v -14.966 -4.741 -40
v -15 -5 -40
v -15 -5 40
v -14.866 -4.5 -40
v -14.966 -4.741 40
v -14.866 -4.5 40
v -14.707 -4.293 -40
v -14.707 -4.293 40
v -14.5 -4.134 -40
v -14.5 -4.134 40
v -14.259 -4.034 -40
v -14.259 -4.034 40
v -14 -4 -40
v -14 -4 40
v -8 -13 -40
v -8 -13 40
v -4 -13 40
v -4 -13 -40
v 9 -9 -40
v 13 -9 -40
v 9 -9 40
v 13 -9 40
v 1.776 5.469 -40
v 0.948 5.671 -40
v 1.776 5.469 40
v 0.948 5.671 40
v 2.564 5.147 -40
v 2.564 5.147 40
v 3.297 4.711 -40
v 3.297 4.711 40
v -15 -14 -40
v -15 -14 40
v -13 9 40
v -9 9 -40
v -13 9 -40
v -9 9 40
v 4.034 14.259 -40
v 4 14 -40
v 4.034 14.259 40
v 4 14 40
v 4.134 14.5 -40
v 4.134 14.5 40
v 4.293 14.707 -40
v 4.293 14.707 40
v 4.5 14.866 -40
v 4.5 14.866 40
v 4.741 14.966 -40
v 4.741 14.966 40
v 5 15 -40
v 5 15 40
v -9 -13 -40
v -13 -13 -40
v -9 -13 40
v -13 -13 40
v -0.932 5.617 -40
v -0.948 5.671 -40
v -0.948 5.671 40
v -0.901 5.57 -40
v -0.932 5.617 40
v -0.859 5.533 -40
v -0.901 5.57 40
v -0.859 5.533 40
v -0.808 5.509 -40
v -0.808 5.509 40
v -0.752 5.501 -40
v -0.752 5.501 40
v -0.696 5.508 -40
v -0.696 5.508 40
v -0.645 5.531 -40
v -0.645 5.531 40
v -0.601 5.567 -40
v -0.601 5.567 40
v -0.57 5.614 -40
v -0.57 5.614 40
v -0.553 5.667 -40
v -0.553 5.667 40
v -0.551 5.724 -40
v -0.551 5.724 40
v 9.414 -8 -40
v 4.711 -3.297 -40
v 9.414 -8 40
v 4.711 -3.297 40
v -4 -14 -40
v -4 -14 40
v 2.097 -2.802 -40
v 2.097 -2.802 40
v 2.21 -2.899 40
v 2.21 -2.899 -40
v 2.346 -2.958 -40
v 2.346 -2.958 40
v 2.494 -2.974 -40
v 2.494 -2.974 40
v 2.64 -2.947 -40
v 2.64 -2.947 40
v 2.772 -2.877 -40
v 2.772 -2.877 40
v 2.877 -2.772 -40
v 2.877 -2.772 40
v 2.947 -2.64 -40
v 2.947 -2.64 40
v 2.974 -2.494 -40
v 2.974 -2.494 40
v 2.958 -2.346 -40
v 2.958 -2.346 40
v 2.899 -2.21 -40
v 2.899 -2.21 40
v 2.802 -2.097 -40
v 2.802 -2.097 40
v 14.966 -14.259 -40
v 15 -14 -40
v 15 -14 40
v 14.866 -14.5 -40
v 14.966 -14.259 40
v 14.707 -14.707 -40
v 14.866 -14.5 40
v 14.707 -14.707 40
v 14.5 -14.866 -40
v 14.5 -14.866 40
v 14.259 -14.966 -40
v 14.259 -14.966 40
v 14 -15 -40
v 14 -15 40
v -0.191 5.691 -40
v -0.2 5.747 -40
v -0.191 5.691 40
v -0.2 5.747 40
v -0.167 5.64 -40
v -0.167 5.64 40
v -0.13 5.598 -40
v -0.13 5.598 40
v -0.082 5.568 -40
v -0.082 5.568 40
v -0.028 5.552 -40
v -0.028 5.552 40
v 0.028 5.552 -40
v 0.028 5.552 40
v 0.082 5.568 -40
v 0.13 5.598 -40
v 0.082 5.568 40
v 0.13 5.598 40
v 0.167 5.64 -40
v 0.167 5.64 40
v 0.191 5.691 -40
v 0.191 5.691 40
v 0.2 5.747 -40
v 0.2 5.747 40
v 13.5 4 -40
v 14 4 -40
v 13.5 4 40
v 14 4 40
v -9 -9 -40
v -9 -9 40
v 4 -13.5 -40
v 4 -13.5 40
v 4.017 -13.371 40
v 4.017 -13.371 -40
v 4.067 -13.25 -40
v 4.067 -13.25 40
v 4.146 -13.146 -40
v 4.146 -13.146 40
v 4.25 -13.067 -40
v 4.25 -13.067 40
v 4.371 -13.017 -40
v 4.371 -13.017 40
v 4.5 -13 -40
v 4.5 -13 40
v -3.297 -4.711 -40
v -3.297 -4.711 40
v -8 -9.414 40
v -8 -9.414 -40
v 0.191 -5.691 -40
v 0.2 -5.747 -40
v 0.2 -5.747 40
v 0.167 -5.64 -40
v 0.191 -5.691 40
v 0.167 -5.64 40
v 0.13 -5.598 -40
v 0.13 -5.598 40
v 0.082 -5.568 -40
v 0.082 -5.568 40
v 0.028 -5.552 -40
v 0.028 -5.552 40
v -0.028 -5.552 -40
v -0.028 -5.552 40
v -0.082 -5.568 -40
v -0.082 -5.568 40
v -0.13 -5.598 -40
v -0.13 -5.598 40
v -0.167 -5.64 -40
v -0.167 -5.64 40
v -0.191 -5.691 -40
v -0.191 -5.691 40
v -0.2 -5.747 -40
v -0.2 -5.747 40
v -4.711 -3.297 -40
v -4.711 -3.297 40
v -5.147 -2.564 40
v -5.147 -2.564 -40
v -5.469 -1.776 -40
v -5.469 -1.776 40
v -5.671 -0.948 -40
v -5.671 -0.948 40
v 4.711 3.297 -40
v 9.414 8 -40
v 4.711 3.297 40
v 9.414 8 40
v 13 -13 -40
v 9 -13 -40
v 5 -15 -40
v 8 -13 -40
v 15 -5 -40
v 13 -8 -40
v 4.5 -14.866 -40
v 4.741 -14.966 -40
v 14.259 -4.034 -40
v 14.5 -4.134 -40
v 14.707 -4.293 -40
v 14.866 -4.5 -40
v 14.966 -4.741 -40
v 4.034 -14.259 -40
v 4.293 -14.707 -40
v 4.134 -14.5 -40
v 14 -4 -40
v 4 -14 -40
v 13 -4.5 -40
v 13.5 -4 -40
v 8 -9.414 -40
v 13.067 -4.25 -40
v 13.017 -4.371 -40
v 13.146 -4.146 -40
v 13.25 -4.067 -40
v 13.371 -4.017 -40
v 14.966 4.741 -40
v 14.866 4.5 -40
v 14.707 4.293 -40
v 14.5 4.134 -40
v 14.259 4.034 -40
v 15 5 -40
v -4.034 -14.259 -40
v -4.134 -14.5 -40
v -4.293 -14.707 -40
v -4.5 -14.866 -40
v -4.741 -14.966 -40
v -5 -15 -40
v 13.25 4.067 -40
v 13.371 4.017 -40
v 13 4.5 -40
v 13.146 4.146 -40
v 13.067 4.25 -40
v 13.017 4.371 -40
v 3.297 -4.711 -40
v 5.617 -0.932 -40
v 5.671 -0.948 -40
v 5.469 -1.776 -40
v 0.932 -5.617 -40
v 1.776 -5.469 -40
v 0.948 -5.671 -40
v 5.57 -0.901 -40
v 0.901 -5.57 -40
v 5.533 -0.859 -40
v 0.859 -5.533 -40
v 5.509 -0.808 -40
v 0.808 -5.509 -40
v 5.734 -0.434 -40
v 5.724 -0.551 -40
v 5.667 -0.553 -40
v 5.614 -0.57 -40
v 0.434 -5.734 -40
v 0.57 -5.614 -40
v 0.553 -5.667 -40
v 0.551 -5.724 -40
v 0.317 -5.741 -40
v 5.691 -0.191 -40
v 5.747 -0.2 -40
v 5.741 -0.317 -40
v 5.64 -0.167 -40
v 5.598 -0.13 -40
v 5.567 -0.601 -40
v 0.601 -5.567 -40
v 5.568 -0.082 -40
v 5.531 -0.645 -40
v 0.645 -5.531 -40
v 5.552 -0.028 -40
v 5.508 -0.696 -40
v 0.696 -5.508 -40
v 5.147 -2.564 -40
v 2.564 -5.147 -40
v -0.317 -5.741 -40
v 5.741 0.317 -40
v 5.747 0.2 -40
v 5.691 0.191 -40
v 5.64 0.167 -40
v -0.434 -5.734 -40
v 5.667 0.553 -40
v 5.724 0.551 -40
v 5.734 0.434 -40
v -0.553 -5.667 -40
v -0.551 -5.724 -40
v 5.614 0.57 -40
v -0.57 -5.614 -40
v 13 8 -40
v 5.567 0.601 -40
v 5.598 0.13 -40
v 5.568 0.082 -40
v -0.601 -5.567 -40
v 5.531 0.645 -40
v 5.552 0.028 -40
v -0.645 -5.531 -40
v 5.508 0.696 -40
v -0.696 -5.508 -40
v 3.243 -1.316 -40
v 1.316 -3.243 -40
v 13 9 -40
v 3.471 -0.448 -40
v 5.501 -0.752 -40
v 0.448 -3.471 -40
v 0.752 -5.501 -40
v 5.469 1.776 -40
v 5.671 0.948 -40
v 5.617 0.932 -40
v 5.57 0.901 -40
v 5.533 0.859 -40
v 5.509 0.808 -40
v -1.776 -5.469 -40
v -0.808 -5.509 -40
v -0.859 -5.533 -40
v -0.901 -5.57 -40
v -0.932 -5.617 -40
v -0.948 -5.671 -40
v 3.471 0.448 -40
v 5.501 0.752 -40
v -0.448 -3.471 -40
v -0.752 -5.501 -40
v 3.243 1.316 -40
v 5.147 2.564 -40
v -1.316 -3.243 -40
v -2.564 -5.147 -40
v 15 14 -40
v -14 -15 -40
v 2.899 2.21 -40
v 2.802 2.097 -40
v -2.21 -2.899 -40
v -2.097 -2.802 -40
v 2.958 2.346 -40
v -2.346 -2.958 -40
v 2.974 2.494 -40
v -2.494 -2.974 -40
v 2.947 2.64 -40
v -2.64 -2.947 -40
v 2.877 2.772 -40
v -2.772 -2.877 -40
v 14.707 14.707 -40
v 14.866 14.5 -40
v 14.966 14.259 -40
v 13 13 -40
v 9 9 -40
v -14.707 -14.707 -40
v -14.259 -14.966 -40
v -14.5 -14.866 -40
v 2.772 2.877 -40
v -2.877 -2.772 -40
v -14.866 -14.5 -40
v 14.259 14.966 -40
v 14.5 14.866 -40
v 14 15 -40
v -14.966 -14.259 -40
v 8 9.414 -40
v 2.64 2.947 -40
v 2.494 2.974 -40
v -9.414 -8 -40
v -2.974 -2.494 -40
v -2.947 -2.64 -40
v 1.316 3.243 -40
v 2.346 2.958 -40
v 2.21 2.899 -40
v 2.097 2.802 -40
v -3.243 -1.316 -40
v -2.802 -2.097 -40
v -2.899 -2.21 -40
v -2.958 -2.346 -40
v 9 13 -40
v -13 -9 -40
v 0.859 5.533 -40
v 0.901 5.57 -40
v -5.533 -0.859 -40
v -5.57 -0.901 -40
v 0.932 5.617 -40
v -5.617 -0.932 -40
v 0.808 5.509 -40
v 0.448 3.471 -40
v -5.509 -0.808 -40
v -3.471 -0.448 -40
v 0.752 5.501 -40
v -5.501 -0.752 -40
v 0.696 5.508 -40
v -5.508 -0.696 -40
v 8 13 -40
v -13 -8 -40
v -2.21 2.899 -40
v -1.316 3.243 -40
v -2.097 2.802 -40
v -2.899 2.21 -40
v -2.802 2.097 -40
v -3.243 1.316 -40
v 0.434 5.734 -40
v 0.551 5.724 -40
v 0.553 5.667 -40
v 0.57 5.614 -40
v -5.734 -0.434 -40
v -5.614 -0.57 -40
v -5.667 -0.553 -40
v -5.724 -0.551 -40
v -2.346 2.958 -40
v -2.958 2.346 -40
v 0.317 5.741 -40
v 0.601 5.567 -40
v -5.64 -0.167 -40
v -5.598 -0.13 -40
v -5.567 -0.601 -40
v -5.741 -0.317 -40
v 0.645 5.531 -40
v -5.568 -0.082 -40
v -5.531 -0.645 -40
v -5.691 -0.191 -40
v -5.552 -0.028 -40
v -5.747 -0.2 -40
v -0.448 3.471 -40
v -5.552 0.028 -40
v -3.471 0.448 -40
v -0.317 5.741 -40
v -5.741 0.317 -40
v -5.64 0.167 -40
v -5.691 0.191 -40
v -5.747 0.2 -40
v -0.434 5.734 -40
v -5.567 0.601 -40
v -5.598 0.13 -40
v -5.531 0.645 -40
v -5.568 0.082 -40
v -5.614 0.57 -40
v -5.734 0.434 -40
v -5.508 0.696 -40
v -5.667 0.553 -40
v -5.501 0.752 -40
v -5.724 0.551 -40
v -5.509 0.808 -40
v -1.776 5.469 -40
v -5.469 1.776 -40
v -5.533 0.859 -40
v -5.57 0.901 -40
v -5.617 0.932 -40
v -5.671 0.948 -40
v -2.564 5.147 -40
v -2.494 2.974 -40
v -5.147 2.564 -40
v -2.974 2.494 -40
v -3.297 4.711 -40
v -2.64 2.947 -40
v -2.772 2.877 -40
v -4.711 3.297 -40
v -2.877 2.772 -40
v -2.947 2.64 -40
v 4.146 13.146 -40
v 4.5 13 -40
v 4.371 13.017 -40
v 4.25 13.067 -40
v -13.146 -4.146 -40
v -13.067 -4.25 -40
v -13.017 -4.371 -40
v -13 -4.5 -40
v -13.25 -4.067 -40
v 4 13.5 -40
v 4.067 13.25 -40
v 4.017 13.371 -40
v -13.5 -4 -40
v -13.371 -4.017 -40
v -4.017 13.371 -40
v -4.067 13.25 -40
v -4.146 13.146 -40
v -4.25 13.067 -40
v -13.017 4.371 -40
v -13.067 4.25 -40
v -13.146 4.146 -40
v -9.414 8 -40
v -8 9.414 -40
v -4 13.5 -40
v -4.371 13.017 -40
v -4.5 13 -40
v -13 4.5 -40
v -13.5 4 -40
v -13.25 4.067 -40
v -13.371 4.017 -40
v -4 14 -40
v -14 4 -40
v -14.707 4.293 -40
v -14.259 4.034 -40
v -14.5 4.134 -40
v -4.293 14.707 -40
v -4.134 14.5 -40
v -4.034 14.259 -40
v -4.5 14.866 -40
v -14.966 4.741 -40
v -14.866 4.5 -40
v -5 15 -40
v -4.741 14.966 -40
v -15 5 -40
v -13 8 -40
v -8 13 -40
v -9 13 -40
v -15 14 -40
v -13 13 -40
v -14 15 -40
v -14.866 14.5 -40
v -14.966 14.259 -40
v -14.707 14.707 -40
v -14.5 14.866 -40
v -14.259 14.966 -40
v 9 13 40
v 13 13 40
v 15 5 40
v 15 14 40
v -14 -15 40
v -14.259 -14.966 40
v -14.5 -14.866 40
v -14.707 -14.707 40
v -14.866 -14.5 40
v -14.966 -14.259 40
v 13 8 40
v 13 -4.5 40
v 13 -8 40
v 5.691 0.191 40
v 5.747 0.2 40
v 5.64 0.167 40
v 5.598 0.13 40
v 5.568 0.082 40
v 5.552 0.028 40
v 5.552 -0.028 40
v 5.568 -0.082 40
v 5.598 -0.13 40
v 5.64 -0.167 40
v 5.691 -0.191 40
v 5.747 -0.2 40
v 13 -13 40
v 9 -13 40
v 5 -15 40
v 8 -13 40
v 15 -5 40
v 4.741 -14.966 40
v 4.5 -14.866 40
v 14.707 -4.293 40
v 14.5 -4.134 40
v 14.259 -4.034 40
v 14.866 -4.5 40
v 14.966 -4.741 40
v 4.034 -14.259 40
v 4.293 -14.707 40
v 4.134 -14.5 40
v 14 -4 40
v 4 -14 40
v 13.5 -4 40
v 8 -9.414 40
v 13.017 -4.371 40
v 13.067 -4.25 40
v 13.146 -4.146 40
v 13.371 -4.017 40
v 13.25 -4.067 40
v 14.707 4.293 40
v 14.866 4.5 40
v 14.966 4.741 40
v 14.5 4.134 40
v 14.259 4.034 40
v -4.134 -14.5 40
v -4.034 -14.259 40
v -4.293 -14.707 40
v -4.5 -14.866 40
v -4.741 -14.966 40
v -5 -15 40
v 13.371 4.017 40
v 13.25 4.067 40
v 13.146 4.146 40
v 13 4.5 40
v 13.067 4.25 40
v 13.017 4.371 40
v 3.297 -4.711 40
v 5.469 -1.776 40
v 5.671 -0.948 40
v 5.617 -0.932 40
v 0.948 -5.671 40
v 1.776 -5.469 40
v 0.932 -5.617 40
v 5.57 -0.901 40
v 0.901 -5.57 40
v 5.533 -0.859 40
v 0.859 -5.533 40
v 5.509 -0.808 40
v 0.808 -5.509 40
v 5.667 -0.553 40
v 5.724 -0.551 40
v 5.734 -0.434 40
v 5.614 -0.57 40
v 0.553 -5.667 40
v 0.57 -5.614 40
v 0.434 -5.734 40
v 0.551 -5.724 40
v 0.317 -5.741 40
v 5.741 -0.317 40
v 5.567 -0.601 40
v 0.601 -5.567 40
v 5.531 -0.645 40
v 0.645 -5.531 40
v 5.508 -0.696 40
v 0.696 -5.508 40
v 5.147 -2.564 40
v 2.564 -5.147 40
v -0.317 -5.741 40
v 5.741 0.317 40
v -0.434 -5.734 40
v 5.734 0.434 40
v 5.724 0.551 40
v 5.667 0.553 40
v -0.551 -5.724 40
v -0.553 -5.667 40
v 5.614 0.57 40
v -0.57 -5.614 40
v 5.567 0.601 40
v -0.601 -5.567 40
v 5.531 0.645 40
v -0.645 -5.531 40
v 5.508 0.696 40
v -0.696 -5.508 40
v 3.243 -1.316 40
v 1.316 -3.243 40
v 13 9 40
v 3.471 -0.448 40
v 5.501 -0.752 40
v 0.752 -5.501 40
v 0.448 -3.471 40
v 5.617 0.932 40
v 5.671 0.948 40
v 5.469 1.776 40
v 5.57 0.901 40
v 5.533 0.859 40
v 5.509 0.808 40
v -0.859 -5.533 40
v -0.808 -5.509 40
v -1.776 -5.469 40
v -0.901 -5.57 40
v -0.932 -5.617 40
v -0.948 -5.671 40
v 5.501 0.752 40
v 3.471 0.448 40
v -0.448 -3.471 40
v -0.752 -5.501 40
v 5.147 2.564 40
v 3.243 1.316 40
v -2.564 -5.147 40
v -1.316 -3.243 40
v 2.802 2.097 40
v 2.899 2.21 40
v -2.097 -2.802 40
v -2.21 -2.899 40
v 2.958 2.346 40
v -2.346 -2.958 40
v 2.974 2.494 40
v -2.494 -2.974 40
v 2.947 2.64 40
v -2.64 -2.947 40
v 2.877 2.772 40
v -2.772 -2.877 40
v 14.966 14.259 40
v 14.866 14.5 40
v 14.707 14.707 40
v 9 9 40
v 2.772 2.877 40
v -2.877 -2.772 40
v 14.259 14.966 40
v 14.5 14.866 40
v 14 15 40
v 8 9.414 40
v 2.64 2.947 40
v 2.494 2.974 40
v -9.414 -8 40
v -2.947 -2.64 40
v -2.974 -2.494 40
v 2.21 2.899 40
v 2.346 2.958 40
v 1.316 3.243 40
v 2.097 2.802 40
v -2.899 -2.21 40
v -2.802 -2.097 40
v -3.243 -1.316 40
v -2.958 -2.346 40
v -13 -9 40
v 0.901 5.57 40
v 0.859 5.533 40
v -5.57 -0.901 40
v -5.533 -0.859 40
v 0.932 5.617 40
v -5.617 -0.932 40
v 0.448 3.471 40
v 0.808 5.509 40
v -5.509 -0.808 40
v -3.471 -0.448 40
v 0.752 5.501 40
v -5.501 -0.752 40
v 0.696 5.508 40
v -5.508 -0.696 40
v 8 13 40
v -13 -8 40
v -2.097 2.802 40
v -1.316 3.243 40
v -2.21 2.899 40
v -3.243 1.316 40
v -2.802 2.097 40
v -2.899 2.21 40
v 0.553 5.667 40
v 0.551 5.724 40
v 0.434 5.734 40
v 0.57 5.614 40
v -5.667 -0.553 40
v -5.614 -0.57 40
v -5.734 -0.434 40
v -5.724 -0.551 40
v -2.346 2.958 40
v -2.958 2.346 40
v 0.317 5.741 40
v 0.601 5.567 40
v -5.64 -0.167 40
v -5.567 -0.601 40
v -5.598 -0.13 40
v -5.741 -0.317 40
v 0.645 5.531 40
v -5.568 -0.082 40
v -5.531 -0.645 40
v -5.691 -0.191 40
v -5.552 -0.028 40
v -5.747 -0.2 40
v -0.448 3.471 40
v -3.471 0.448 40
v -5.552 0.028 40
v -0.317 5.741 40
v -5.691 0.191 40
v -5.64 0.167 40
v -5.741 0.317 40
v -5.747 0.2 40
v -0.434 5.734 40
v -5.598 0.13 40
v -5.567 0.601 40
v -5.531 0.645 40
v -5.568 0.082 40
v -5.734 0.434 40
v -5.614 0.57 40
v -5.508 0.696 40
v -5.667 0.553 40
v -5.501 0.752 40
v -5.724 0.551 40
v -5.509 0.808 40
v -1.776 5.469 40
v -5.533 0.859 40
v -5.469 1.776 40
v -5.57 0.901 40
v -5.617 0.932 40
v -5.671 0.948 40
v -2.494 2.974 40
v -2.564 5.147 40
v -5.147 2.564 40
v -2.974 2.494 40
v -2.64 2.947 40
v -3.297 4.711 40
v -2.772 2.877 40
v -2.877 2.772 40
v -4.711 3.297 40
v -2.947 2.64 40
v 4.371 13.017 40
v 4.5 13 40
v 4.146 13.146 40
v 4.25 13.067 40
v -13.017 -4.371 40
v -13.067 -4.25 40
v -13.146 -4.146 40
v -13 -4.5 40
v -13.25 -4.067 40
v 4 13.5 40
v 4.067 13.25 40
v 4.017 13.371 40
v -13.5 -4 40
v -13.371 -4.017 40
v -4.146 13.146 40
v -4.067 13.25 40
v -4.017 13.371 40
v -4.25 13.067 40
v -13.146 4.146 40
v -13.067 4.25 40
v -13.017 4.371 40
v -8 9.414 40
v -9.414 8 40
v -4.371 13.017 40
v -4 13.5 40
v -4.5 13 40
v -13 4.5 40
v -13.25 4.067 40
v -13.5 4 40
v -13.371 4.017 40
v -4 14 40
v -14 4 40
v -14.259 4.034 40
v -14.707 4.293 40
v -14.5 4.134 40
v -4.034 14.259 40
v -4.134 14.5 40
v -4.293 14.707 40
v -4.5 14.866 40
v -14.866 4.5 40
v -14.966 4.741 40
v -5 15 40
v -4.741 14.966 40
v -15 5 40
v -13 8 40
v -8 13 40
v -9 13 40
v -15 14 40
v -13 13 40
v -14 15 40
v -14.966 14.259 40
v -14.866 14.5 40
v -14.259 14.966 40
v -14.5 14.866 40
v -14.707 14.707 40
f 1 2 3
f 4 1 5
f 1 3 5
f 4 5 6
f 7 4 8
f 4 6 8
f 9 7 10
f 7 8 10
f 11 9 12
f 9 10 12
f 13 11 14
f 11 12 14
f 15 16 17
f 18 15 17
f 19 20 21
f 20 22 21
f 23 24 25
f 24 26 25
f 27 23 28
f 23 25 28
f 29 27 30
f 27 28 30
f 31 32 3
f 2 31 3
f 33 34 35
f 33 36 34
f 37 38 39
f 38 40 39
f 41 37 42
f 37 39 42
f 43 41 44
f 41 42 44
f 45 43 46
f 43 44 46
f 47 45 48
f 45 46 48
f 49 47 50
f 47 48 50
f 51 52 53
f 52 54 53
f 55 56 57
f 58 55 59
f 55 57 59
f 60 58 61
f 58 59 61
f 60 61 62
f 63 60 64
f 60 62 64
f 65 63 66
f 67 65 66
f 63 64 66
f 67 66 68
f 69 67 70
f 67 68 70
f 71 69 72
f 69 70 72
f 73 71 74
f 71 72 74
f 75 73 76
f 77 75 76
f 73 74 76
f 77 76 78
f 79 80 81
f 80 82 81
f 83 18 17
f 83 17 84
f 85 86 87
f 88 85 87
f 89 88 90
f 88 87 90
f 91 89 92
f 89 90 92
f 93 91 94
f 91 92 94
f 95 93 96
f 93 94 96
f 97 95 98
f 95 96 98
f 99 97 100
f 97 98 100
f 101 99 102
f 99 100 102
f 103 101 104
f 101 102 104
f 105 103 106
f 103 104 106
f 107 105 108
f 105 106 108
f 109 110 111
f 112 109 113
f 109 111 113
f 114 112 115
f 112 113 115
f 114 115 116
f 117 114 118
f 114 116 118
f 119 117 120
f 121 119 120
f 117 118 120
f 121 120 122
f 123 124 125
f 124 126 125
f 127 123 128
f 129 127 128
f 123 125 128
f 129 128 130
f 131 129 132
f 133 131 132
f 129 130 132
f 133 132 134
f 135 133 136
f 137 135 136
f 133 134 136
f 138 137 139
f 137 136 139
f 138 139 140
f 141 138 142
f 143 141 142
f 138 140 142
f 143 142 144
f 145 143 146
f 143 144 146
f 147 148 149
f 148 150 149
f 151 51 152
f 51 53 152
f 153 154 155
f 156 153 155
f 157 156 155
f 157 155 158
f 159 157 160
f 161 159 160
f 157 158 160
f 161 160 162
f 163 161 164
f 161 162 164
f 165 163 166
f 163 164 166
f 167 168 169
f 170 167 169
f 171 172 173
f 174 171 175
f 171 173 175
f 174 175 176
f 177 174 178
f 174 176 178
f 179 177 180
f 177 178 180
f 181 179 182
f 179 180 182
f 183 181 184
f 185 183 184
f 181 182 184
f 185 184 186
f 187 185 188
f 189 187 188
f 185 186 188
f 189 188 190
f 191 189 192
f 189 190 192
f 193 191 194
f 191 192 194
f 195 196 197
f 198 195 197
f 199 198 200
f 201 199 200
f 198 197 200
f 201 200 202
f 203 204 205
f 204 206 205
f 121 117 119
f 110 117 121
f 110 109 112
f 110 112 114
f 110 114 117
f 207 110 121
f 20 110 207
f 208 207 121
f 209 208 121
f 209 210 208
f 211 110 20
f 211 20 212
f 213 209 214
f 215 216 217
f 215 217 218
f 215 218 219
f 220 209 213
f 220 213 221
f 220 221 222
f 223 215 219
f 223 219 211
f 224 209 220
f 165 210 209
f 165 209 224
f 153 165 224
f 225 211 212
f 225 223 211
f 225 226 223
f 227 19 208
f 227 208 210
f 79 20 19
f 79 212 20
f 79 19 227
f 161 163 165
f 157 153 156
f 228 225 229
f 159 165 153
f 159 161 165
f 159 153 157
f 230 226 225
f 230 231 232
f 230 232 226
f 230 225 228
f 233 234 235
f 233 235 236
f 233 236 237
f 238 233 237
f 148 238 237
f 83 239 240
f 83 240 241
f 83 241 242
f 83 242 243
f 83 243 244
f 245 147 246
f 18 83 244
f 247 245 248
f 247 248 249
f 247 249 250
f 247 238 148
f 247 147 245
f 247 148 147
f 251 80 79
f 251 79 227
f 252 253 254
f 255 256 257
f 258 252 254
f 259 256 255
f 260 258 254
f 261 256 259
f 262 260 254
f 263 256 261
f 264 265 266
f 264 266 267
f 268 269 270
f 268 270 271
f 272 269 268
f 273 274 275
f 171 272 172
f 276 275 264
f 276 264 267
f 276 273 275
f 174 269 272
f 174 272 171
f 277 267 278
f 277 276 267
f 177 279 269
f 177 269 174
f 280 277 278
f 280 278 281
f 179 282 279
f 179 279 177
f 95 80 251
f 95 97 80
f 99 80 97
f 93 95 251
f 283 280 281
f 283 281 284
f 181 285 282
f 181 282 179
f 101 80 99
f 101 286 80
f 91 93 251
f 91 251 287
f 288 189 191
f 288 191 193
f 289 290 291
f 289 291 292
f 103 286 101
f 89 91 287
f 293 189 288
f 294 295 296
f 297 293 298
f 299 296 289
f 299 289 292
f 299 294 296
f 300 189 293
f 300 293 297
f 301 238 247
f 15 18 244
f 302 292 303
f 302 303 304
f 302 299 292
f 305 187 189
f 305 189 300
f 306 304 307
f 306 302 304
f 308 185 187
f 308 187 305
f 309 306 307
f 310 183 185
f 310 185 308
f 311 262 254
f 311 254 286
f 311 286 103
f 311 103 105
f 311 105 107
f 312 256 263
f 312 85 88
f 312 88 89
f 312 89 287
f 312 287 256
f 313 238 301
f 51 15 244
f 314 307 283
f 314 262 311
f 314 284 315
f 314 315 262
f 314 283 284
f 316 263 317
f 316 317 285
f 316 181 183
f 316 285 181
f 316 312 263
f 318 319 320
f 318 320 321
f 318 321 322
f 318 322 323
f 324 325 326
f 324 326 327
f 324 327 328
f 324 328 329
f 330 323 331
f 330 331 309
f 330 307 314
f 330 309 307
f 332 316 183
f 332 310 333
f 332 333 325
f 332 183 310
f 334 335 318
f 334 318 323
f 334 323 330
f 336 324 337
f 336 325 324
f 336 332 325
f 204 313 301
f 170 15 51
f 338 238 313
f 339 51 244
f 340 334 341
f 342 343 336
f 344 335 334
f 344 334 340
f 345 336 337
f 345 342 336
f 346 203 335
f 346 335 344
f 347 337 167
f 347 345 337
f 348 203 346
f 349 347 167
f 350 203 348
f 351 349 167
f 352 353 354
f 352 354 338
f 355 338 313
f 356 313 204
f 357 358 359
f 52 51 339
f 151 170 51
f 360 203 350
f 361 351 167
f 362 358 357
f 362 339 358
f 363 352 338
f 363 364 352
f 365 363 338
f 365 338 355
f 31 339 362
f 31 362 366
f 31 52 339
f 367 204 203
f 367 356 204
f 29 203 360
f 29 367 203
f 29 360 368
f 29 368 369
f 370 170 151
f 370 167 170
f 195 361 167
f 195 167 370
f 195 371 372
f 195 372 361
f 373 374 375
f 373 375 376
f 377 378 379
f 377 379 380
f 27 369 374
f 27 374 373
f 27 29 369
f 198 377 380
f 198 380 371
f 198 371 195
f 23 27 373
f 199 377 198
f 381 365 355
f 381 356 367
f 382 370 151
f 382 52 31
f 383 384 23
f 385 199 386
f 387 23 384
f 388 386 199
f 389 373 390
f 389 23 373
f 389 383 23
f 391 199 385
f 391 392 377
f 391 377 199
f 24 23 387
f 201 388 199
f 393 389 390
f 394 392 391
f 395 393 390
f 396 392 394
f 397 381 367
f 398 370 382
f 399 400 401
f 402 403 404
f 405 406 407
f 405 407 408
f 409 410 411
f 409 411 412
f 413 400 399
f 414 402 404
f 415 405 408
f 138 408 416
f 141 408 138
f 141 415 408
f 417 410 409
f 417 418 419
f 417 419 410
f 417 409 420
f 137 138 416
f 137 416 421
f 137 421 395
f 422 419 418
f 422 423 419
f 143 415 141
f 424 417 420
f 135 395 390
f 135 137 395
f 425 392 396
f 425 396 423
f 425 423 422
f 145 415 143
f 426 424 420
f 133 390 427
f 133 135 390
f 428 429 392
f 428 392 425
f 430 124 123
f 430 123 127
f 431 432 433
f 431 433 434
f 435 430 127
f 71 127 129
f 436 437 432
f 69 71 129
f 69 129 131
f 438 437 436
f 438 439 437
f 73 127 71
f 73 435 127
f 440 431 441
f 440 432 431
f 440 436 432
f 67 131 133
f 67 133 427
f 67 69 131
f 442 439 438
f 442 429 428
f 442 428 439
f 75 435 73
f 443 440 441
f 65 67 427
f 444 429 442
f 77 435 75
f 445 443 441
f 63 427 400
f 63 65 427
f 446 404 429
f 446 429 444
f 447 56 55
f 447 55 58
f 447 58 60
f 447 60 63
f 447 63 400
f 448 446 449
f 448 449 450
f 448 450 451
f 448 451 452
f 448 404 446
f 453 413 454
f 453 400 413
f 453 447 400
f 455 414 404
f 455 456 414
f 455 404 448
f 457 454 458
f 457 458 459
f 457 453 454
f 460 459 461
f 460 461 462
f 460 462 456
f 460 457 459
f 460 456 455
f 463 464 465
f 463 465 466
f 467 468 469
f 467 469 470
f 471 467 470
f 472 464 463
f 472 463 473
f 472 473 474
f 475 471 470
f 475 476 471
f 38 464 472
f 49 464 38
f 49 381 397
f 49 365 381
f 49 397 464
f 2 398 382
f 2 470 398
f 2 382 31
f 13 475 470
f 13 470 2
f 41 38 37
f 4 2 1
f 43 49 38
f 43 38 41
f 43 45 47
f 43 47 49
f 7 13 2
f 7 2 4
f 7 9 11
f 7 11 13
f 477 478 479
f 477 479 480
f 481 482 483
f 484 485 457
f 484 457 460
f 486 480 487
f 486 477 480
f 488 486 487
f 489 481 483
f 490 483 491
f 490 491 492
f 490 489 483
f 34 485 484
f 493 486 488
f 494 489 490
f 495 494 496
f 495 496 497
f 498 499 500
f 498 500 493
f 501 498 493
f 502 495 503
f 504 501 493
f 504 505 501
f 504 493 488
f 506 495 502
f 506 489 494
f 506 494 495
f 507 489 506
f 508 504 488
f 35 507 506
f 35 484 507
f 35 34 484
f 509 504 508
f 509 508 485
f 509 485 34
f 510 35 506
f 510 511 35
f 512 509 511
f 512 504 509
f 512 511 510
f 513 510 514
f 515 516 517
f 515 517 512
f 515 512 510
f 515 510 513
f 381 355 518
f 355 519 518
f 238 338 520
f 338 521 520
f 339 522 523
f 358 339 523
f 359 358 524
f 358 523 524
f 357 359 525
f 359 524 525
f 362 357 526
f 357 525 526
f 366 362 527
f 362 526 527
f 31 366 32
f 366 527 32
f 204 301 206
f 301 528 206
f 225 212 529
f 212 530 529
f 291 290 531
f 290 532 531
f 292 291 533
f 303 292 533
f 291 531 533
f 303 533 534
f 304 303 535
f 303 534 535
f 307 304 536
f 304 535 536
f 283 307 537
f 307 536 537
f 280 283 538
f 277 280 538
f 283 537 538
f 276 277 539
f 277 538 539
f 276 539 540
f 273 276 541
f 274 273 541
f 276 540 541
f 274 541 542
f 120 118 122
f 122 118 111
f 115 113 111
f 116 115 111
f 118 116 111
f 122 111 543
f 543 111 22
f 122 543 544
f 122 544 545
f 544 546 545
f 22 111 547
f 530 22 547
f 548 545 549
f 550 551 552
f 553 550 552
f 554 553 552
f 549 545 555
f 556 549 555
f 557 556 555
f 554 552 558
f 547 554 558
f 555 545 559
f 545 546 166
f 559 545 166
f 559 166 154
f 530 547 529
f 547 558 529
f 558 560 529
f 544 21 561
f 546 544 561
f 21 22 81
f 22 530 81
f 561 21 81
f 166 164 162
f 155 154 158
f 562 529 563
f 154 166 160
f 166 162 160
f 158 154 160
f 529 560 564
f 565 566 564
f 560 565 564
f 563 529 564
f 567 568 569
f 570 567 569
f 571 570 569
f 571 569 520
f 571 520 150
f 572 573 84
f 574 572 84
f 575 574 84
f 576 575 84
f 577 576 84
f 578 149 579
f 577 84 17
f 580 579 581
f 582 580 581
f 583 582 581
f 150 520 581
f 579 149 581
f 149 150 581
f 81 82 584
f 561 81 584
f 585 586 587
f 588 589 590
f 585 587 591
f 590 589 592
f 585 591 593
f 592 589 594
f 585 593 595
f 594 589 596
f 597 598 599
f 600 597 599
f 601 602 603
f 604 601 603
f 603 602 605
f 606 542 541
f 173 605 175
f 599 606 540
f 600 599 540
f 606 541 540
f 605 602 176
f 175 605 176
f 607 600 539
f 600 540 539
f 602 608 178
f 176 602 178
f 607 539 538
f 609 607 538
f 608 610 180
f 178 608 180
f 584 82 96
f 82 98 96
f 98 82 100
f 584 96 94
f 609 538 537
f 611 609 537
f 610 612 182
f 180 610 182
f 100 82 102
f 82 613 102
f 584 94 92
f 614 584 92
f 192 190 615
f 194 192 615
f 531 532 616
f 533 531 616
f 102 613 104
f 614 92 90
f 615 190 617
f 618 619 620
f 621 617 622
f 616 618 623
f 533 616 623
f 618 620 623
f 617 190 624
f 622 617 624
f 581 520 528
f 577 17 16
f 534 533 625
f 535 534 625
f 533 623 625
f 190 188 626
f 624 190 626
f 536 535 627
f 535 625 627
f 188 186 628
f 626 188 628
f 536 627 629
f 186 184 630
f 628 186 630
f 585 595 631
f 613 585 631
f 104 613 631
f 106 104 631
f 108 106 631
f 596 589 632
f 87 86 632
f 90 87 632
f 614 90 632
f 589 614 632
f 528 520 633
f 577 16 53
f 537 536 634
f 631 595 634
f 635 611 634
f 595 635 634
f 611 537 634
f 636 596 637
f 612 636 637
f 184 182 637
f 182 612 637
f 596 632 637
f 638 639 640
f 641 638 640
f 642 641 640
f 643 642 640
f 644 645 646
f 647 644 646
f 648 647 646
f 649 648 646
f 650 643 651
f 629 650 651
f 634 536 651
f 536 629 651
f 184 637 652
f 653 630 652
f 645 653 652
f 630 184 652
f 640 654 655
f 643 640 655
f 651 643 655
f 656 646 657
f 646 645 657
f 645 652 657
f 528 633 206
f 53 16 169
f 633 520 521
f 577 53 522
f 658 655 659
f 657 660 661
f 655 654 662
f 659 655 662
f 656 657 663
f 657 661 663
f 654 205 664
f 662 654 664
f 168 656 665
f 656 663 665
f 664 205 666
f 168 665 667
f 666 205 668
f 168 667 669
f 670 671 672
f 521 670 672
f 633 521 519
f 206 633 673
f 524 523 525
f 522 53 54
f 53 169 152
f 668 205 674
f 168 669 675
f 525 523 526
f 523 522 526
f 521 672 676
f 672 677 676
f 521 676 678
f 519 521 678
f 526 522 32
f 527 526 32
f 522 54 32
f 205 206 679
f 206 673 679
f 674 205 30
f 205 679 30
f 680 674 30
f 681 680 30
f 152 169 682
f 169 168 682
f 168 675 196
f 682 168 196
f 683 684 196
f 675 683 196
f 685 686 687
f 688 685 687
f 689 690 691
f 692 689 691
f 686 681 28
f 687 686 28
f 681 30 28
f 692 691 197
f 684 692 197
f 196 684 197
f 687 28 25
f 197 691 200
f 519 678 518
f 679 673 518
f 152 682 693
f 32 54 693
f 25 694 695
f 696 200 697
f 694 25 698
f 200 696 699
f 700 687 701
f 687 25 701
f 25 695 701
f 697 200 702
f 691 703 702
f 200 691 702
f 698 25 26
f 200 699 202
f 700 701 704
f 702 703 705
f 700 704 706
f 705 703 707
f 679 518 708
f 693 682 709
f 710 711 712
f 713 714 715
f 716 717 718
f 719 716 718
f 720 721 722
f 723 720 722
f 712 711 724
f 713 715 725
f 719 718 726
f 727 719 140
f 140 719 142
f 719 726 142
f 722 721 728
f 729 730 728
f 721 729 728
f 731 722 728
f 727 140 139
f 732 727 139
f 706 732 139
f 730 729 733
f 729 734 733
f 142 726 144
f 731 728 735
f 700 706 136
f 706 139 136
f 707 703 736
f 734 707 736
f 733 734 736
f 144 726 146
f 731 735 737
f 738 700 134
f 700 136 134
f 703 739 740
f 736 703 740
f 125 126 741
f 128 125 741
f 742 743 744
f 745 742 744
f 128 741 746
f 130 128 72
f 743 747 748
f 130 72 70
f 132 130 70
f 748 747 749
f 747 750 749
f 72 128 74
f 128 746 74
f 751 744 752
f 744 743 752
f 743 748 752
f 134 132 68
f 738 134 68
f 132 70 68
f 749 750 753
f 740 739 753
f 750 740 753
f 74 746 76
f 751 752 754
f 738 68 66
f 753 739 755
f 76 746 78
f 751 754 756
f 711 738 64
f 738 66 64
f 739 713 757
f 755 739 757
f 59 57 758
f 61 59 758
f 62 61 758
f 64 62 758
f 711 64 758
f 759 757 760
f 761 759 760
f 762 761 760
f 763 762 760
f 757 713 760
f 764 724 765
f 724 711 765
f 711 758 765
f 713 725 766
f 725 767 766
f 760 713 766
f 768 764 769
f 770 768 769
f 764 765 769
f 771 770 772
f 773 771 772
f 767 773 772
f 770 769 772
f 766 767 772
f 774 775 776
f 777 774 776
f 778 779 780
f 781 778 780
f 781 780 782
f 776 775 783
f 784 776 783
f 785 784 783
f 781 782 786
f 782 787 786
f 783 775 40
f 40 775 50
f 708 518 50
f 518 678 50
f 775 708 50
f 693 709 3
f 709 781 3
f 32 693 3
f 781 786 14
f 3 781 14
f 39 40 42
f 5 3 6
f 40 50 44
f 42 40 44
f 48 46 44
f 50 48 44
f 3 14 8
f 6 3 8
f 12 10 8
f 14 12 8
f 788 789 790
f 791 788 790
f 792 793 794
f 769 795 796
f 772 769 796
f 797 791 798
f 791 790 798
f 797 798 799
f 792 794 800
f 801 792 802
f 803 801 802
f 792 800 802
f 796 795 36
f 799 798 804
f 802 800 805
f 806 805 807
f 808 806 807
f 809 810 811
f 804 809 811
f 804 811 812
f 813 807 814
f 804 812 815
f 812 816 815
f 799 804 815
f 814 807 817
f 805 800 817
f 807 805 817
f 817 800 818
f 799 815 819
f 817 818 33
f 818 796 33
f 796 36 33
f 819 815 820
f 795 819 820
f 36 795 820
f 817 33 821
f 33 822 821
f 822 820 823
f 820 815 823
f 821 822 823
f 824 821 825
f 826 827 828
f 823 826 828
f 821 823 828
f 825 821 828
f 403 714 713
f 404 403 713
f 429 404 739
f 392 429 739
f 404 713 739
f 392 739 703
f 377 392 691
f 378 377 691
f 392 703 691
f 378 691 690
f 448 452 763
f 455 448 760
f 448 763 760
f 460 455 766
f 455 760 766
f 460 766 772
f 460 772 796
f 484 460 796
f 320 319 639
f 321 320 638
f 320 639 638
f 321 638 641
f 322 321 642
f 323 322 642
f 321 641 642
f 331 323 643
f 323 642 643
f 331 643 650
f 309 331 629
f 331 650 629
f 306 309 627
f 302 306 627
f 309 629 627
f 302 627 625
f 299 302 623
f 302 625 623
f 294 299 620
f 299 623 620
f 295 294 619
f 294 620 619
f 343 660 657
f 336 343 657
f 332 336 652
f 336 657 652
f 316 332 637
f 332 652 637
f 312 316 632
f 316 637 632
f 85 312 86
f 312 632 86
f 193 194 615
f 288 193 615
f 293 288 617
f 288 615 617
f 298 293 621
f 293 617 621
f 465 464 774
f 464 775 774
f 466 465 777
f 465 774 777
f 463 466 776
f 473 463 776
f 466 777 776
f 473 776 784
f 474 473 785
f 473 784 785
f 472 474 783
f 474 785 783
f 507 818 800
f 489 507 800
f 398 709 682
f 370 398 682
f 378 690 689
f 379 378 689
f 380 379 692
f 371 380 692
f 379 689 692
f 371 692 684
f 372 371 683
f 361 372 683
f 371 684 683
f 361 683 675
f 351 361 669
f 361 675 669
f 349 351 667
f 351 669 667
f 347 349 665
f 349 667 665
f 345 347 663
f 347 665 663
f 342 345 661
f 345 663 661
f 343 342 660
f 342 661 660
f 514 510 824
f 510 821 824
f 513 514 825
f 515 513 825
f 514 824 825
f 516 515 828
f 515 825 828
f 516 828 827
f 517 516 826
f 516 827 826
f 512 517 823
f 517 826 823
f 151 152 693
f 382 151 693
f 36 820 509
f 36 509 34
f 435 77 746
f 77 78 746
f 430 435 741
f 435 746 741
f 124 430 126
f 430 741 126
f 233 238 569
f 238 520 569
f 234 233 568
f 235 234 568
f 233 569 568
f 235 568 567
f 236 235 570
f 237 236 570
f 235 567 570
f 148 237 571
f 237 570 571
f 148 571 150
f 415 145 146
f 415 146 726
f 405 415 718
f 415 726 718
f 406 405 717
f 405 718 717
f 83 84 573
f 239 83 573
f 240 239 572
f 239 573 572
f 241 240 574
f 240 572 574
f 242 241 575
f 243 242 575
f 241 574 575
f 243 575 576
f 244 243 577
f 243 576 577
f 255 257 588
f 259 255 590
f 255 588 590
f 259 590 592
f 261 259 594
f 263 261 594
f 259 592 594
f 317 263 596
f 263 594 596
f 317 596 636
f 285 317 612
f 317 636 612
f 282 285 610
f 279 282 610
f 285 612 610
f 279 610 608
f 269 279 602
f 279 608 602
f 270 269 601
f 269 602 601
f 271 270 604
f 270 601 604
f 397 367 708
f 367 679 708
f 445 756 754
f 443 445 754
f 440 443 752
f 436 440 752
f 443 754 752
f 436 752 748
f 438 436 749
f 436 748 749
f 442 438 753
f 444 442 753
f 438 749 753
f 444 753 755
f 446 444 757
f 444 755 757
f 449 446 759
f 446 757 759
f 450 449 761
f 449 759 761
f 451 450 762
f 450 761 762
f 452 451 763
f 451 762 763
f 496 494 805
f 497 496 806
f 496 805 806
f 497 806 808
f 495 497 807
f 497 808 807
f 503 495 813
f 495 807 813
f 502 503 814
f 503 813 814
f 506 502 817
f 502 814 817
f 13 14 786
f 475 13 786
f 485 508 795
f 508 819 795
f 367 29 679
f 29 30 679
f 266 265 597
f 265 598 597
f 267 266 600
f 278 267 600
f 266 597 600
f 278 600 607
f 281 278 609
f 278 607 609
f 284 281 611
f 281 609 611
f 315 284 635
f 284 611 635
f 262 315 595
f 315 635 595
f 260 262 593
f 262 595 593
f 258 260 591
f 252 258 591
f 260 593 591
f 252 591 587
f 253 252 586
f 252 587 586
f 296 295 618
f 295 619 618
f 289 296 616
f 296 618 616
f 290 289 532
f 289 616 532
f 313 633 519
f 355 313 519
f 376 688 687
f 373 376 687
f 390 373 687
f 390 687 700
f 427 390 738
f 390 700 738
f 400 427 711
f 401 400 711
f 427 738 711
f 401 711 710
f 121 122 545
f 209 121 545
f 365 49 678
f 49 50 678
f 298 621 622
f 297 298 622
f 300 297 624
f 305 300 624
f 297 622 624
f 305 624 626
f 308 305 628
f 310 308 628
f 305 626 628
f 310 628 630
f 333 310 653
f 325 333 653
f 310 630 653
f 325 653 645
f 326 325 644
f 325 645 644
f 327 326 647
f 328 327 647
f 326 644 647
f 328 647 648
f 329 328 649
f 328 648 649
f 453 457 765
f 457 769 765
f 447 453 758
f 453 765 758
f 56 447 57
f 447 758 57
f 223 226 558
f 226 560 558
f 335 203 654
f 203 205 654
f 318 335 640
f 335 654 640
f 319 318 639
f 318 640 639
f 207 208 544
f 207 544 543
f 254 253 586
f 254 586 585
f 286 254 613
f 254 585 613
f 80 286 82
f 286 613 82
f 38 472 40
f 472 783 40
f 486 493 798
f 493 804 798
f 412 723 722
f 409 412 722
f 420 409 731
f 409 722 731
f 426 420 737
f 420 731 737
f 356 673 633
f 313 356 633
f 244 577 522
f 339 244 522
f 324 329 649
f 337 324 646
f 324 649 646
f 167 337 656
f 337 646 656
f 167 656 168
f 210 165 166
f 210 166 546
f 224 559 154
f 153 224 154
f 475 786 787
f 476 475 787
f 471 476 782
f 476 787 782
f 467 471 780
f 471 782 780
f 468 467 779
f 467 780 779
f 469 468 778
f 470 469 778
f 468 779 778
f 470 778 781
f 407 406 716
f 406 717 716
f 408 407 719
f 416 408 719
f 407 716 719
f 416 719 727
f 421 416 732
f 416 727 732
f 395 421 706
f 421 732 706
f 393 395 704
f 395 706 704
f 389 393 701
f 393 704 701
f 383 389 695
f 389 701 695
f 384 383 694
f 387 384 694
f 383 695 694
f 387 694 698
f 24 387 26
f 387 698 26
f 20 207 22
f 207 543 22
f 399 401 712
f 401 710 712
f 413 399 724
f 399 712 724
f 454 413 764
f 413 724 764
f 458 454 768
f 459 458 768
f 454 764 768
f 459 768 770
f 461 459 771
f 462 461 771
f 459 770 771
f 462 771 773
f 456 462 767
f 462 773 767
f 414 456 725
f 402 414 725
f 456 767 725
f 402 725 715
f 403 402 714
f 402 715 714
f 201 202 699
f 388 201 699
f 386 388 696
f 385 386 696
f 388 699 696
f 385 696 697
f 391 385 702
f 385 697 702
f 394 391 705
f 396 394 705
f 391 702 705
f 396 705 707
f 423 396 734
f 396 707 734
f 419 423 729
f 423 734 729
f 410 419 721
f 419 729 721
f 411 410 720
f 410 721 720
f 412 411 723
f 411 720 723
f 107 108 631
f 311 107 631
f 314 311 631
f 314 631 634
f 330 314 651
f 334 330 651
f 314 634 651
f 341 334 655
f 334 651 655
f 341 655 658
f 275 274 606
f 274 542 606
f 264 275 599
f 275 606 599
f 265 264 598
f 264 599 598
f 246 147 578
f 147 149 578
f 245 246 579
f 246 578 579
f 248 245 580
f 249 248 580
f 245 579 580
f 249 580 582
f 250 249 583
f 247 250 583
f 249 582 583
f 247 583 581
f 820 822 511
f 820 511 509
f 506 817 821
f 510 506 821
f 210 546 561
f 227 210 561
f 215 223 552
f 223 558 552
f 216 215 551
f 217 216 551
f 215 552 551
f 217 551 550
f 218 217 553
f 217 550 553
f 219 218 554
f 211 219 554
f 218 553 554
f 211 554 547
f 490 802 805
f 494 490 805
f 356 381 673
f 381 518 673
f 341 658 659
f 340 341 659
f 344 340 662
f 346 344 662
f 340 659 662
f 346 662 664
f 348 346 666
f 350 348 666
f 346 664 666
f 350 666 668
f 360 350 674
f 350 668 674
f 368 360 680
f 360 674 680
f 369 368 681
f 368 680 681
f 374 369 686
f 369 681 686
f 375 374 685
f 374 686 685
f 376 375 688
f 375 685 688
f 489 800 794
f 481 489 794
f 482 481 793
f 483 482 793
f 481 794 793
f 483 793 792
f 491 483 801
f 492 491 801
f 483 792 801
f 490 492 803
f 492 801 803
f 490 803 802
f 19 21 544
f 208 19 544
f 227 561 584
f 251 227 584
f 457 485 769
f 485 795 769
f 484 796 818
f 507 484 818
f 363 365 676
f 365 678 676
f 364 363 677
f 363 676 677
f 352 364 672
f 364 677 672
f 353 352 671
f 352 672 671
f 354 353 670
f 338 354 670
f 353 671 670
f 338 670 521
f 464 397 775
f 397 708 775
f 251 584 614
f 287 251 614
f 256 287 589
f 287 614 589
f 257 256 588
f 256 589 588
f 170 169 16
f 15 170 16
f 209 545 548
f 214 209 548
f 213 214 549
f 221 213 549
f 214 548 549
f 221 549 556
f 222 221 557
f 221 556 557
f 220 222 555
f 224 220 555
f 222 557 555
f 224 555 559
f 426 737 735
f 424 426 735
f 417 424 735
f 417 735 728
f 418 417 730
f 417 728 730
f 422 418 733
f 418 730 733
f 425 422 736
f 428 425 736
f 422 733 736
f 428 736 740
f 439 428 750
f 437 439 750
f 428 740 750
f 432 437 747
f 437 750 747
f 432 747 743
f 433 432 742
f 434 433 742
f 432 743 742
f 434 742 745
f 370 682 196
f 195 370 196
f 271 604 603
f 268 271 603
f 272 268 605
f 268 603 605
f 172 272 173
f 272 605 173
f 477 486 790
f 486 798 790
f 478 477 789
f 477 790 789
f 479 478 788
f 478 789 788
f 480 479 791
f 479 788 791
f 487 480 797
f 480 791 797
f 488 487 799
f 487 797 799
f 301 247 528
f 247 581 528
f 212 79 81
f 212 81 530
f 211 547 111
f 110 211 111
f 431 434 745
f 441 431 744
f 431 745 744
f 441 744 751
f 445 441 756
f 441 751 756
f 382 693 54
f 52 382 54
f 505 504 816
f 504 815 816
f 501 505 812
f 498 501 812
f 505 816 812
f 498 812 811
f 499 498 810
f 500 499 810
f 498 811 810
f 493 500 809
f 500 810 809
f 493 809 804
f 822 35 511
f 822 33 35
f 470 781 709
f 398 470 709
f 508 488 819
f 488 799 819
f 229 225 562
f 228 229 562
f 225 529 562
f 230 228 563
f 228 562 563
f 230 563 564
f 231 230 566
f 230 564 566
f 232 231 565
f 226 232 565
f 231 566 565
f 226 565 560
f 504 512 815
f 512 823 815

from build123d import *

# Parameters (mm, degrees)
BOSS_EXTRUDE1_DEPTH = 40


with BuildPart() as part:
    # Sketch1 → Boss-Extrude1 (new, symmetric)
    with BuildSketch(Plane.XY):
        with BuildLine():
            Line((-15, 5.000000000000009), (-15, 13.999999999999993))
            ThreePointArc((-15, 13.999999999999993), (-14.707106781186548, 14.70710678118655), (-13.999999999999991, 15.000000000000002))
            Line((-13.999999999999991, 15.000000000000002), (-5.000000000000007, 15.000000000000002))
            ThreePointArc((-5.000000000000007, 15.000000000000002), (-4.292893218813452, 14.707106781186548), (-4, 13.999999999999993))
            Line((-4, 13.999999999999993), (-4, 13.500000000000004))
            ThreePointArc((-4, 13.500000000000004), (-4.146446609406727, 13.146446609406725), (-4.500000000000005, 13))
            Line((-4.500000000000005, 13), (-8.000000000000005, 13.000000000000016))
            Line((-8.000000000000005, 13.000000000000016), (-7.999999999999849, 9.414213562373025))
            Line((-7.999999999999849, 9.414213562373025), (-3.2967975633251787, 4.711011125698298))
            ThreePointArc((-3.2967975633251787, 4.711011125698298), (-2.175943249756075, 5.3223839558829855), (-0.9478077024559322, 5.67134556866048))
            ThreePointArc((-0.9478077024559322, 5.67134556866048), (-0.7239130434782917, 5.502585747217556), (-0.5512849251433612, 5.72351159091246))
            ThreePointArc((-0.5512849251433612, 5.72351159091246), (-0.3758034914685008, 5.737706138850234), (-0.1999697519659725, 5.746521739130396))
            ThreePointArc((-0.1999697519659725, 5.746521739130396), (-0.14018621156536692, 5.607354193587874), (-2.429e-14, 5.549999999999962))
            ThreePointArc((-2.429e-14, 5.549999999999962), (0.14018621156537447, 5.607354193587863), (0.1999697519659689, 5.746521739130433))
            ThreePointArc((0.1999697519659689, 5.746521739130433), (0.37580349146849373, 5.737706138850271), (0.5512849251433537, 5.723511590912496))
            ThreePointArc((0.5512849251433537, 5.723511590912496), (0.7239130434782822, 5.502585747217588), (0.9478077024559303, 5.671345568660512))
            ThreePointArc((0.9478077024559303, 5.671345568660512), (2.1759432497560995, 5.32238395588301), (3.2967975633252076, 4.711011125698281))
            Line((3.2967975633252076, 4.711011125698281), (8.000000000000027, 9.414213562373071))
            Line((8.000000000000027, 9.414213562373071), (8.000000000000039, 12.999999999999977))
            Line((8.000000000000039, 12.999999999999977), (4.500000000000051, 12.999999999999986))
            ThreePointArc((4.500000000000051, 12.999999999999986), (4.146446609406774, 13.146446609406713), (4.000000000000049, 13.499999999999991))
            Line((4.000000000000049, 13.499999999999991), (4.000000000000051, 13.999999999999977))
            ThreePointArc((4.000000000000051, 13.999999999999977), (4.292893218813505, 14.70710678118653), (5.00000000000006, 14.999999999999982))
            Line((5.00000000000006, 14.999999999999982), (14.000000000000046, 14.99999999999995))
            ThreePointArc((14.000000000000046, 14.99999999999995), (14.7071067811866, 14.707106781186495), (15.00000000000005, 13.99999999999994))
            Line((15.00000000000005, 13.99999999999994), (15.000000000000018, 4.999999999999955))
            ThreePointArc((15.000000000000018, 4.999999999999955), (14.707106781186562, 4.2928932188134015), (14.000000000000007, 3.9999999999999516))
            Line((14.000000000000007, 3.9999999999999516), (13.500000000000018, 3.9999999999999534))
            ThreePointArc((13.500000000000018, 3.9999999999999534), (13.146446609406741, 4.146446609406682), (13.000000000000014, 4.499999999999961))
            Line((13.000000000000014, 4.499999999999961), (13.000000000000044, 7.99999999999996))
            Line((13.000000000000044, 7.99999999999996), (9.414213562373115, 7.9999999999999725))
            Line((9.414213562373115, 7.9999999999999725), (4.711011125698292, 3.2967975633251885))
            ThreePointArc((4.711011125698292, 3.2967975633251885), (5.322383955882988, 2.1759432497560716), (5.671345568660484, 0.9478077024559123))
            ThreePointArc((5.671345568660484, 0.9478077024559123), (5.502585747217559, 0.7239130434782725), (5.723511590912461, 0.5512849251433413))
            ThreePointArc((5.723511590912461, 0.5512849251433413), (5.7377061388502355, 0.37580349146848013), (5.746521739130397, 0.19996975196595243))
            ThreePointArc((5.746521739130397, 0.19996975196595243), (5.607354193587875, 0.14018621156534747), (5.549999999999962, 4.91e-15))
            ThreePointArc((5.549999999999962, 4.91e-15), (5.60735419358786, -0.1401862115653925), (5.746521739130428, -0.1999697519659527))
            ThreePointArc((5.746521739130428, -0.1999697519659527), (5.737706138850272, -0.3758034914684969), (5.723511590912494, -0.5512849251433738))
            ThreePointArc((5.723511590912494, -0.5512849251433738), (5.502585747217585, -0.7239130434783013), (5.6713455686605085, -0.94780770245595))
            ThreePointArc((5.6713455686605085, -0.94780770245595), (5.3223839558830015, -2.175943249756118), (4.711011125698269, -3.296797563325224))
            Line((4.711011125698269, -3.296797563325224), (9.414213562373133, -7.999999999999714))
            Line((9.414213562373133, -7.999999999999714), (13.000000000000002, -7.99999999999998))
            Line((13.000000000000002, -7.99999999999998), (12.999999999999952, -4.499999999999787))
            ThreePointArc((12.999999999999952, -4.499999999999787), (13.146446609406702, -4.146446609406478), (13.50000000000003, -3.999999999999776))
            Line((13.50000000000003, -3.999999999999776), (14.000000000000144, -3.9999999999998517))
            ThreePointArc((14.000000000000144, -3.9999999999998517), (14.707106781186603, -4.292893218813357), (15.000000000000002, -4.999999999999859))
            Line((15.000000000000002, -4.999999999999859), (15.000000000000004, -14.000000000000002))
            ThreePointArc((15.000000000000004, -14.000000000000002), (14.70710678118655, -14.707106781186548), (14.000000000000004, -15.000000000000004))
            Line((14.000000000000004, -15.000000000000004), (5.000000000000161, -15.000000000000002))
            ThreePointArc((5.000000000000161, -15.000000000000002), (4.2928932188135525, -14.707106781186496), (4.000000000000154, -13.999999999999844))
            Line((4.000000000000154, -13.999999999999844), (4.000000000000229, -13.499999999999826))
            ThreePointArc((4.000000000000229, -13.499999999999826), (4.146446609406977, -13.1464466094066), (4.500000000000221, -12.999999999999897))
            Line((4.500000000000221, -12.999999999999897), (8.000000000000153, -12.999999999999817))
            Line((8.000000000000153, -12.999999999999817), (7.99999999999994, -9.414213562373144))
            Line((7.99999999999994, -9.414213562373144), (3.296797563325172, -4.711011125698304))
            ThreePointArc((3.296797563325172, -4.711011125698304), (2.175943249756054, -5.322383955882996), (0.9478077024558925, -5.671345568660487))
            ThreePointArc((0.9478077024558925, -5.671345568660487), (0.7239130434782536, -5.502585747217561), (0.5512849251433212, -5.723511590912463))
            ThreePointArc((0.5512849251433212, -5.723511590912463), (0.3758034914684597, -5.7377061388502355), (0.19996975196593236, -5.746521739130398))
            ThreePointArc((0.19996975196593236, -5.746521739130398), (0.14018621156532793, -5.6073541935878755), (-1.447e-14, -5.549999999999962))
            ThreePointArc((-1.447e-14, -5.549999999999962), (-0.14018621156541247, -5.60735419358786), (-0.19996975196595235, -5.746521739130428))
            ThreePointArc((-0.19996975196595235, -5.746521739130428), (-0.37580349146850606, -5.737706138850271), (-0.5512849251433938, -5.723511590912492))
            ThreePointArc((-0.5512849251433938, -5.723511590912492), (-0.7239130434783215, -5.502585747217583), (-0.9478077024559699, -5.671345568660507))
            ThreePointArc((-0.9478077024559699, -5.671345568660507), (-2.175943249756137, -5.322383955882994), (-3.2967975633252404, -4.711011125698258))
            Line((-3.2967975633252404, -4.711011125698258), (-7.99999999999998, -9.414213562373098))
            Line((-7.99999999999998, -9.414213562373098), (-7.99999999999998, -13.000000000000002))
            Line((-7.99999999999998, -13.000000000000002), (-4.000000000000001, -13.000000000000002))
            Line((-4.000000000000001, -13.000000000000002), (-4.000000000000001, -13.999999999999995))
            ThreePointArc((-4.000000000000001, -13.999999999999995), (-4.292893218813453, -14.70710678118655), (-5.000000000000008, -15.000000000000002))
            Line((-5.000000000000008, -15.000000000000002), (-13.999999999999998, -15.000000000000004))
            ThreePointArc((-13.999999999999998, -15.000000000000004), (-14.707106781186546, -14.707106781186553), (-15.000000000000004, -14.000000000000005))
            Line((-15.000000000000004, -14.000000000000005), (-15.000000000000002, -5.0000000000000115))
            ThreePointArc((-15.000000000000002, -5.0000000000000115), (-14.70710678118655, -4.292893218813457), (-13.999999999999995, -4.000000000000004))
            Line((-13.999999999999995, -4.000000000000004), (-13.500000000000007, -4.000000000000004))
            ThreePointArc((-13.500000000000007, -4.000000000000004), (-13.14644660940673, -4.1464466094067305), (-13.000000000000004, -4.500000000000007))
            Line((-13.000000000000004, -4.500000000000007), (-13.000000000000002, -8.000000000000002))
            Line((-13.000000000000002, -8.000000000000002), (-9.414213562373073, -8))
            Line((-9.414213562373073, -8), (-4.711011125698316, -3.2967975633251556))
            ThreePointArc((-4.711011125698316, -3.2967975633251556), (-5.322383955883002, -2.175943249756036), (-5.67134556866049, -0.9478077024558731))
            ThreePointArc((-5.67134556866049, -0.9478077024558731), (-5.502585747217563, -0.7239130434782345), (-5.723511590912465, -0.5512849251433016))
            ThreePointArc((-5.723511590912465, -0.5512849251433016), (-5.737706138850236, -0.3758034914684416), (-5.746521739130398, -0.1999697519659127))
            ThreePointArc((-5.746521739130398, -0.1999697519659127), (-5.607354193587914, -0.1401862115652944), (-5.549999999999999, -2.5e-16))
            ThreePointArc((-5.549999999999999, -2.5e-16), (-5.607354193587905, 0.1401862115653443), (-5.746521739130434, 0.19996975196594882))
            ThreePointArc((-5.746521739130434, 0.19996975196594882), (-5.737706138850273, 0.375803491468473), (-5.723511590912498, 0.5512849251433337))
            ThreePointArc((-5.723511590912498, 0.5512849251433337), (-5.502585747217591, 0.7239130434782631), (-5.671345568660516, 0.9478077024559104))
            ThreePointArc((-5.671345568660516, 0.9478077024559104), (-5.322383955883011, 2.17594324975609), (-4.711011125698278, 3.29679756332521))
            Line((-4.711011125698278, 3.29679756332521), (-9.414213562372948, 7.9999999999999325))
            Line((-9.414213562372948, 7.9999999999999325), (-13.000000000000005, 7.999999999999993))
            Line((-13.000000000000005, 7.999999999999993), (-13.000000000000002, 4.500000000000005))
            ThreePointArc((-13.000000000000002, 4.500000000000005), (-13.146446609406727, 4.146446609406728), (-13.500000000000005, 4.000000000000002))
            Line((-13.500000000000005, 4.000000000000002), (-13.999999999999991, 4.000000000000002))
            ThreePointArc((-13.999999999999991, 4.000000000000002), (-14.707106781186546, 4.292893218813454), (-15, 5.000000000000009))
        make_face()
        Polygon((-13.000000000000007, 9.000000000000016), (-12.999999999999853, 13.000000000000005), (-9.000000000000007, 13.000000000000016), (-8.999999999999853, 8.999999999999956), align=None, mode=Mode.SUBTRACT)
        Polygon((13.000000000000043, 12.999999999999956), (9.000000000000062, 12.999999999999975), (9.000000000000048, 8.999999999999975), (13.000000000000048, 8.999999999999961), align=None, mode=Mode.SUBTRACT)
        Polygon((13.000000000000004, -13.000000000000002), (13.000000000000004, -9.000000000000004), (9.000000000000062, -8.999999999999746), (9.000000000000105, -12.99999999999975), align=None, mode=Mode.SUBTRACT)
        Polygon((-13.000000000000002, -13.000000000000004), (-9.000000000000004, -13.000000000000004), (-9.000000000000004, -9.000000000000005), (-13, -9.000000000000007), align=None, mode=Mode.SUBTRACT)
        with BuildLine():
            ThreePointArc((3e-16, 3.5000000000000018), (-1.105000944452059, 3.320989748969435), (-2.096969605215332, 2.8022702358628915))
            ThreePointArc((-2.096969605215332, 2.8022702358628915), (-2.8284271247461614, 2.8284271247461947), (-2.8022702358628897, 2.0969696052153344))
            ThreePointArc((-2.8022702358628897, 2.0969696052153344), (-3.320989748969433, 1.1050009444520614), (-3.5, 1.73e-15))
            ThreePointArc((-3.5, 1.73e-15), (-3.320989748969439, -1.1050009444520394), (-2.8022702358629137, -2.096969605215303))
            ThreePointArc((-2.8022702358629137, -2.096969605215303), (-2.828427124746224, -2.8284271247461628), (-2.0969696052153637, -2.802270235862868))
            ThreePointArc((-2.0969696052153637, -2.802270235862868), (-1.1050009444520896, -3.3209897489694247), (-2.474e-14, -3.5000000000000018))
            ThreePointArc((-2.474e-14, -3.5000000000000018), (1.1050009444520363, -3.3209897489694424), (2.0969696052153126, -2.8022702358629066))
            ThreePointArc((2.0969696052153126, -2.8022702358629066), (2.8284271247461725, -2.828427124746214), (2.8022702358628746, -2.096969605215354))
            ThreePointArc((2.8022702358628746, -2.096969605215354), (3.3209897489694282, -1.1050009444520785), (3.5000000000000018, -1.252e-14))
            ThreePointArc((3.5000000000000018, -1.252e-14), (3.320989748969439, 1.1050009444520479), (2.802270235862899, 2.096969605215322))
            ThreePointArc((2.802270235862899, 2.096969605215322), (2.828427124746204, 2.828427124746182), (2.096969605215344, 2.802270235862882))
            ThreePointArc((2.096969605215344, 2.802270235862882), (1.1050009444520668, 3.320989748969432), (3e-16, 3.5000000000000018))
        make_face(mode=Mode.SUBTRACT)
    extrude(amount=BOSS_EXTRUDE1_DEPTH, both=True)


solid = part.part
